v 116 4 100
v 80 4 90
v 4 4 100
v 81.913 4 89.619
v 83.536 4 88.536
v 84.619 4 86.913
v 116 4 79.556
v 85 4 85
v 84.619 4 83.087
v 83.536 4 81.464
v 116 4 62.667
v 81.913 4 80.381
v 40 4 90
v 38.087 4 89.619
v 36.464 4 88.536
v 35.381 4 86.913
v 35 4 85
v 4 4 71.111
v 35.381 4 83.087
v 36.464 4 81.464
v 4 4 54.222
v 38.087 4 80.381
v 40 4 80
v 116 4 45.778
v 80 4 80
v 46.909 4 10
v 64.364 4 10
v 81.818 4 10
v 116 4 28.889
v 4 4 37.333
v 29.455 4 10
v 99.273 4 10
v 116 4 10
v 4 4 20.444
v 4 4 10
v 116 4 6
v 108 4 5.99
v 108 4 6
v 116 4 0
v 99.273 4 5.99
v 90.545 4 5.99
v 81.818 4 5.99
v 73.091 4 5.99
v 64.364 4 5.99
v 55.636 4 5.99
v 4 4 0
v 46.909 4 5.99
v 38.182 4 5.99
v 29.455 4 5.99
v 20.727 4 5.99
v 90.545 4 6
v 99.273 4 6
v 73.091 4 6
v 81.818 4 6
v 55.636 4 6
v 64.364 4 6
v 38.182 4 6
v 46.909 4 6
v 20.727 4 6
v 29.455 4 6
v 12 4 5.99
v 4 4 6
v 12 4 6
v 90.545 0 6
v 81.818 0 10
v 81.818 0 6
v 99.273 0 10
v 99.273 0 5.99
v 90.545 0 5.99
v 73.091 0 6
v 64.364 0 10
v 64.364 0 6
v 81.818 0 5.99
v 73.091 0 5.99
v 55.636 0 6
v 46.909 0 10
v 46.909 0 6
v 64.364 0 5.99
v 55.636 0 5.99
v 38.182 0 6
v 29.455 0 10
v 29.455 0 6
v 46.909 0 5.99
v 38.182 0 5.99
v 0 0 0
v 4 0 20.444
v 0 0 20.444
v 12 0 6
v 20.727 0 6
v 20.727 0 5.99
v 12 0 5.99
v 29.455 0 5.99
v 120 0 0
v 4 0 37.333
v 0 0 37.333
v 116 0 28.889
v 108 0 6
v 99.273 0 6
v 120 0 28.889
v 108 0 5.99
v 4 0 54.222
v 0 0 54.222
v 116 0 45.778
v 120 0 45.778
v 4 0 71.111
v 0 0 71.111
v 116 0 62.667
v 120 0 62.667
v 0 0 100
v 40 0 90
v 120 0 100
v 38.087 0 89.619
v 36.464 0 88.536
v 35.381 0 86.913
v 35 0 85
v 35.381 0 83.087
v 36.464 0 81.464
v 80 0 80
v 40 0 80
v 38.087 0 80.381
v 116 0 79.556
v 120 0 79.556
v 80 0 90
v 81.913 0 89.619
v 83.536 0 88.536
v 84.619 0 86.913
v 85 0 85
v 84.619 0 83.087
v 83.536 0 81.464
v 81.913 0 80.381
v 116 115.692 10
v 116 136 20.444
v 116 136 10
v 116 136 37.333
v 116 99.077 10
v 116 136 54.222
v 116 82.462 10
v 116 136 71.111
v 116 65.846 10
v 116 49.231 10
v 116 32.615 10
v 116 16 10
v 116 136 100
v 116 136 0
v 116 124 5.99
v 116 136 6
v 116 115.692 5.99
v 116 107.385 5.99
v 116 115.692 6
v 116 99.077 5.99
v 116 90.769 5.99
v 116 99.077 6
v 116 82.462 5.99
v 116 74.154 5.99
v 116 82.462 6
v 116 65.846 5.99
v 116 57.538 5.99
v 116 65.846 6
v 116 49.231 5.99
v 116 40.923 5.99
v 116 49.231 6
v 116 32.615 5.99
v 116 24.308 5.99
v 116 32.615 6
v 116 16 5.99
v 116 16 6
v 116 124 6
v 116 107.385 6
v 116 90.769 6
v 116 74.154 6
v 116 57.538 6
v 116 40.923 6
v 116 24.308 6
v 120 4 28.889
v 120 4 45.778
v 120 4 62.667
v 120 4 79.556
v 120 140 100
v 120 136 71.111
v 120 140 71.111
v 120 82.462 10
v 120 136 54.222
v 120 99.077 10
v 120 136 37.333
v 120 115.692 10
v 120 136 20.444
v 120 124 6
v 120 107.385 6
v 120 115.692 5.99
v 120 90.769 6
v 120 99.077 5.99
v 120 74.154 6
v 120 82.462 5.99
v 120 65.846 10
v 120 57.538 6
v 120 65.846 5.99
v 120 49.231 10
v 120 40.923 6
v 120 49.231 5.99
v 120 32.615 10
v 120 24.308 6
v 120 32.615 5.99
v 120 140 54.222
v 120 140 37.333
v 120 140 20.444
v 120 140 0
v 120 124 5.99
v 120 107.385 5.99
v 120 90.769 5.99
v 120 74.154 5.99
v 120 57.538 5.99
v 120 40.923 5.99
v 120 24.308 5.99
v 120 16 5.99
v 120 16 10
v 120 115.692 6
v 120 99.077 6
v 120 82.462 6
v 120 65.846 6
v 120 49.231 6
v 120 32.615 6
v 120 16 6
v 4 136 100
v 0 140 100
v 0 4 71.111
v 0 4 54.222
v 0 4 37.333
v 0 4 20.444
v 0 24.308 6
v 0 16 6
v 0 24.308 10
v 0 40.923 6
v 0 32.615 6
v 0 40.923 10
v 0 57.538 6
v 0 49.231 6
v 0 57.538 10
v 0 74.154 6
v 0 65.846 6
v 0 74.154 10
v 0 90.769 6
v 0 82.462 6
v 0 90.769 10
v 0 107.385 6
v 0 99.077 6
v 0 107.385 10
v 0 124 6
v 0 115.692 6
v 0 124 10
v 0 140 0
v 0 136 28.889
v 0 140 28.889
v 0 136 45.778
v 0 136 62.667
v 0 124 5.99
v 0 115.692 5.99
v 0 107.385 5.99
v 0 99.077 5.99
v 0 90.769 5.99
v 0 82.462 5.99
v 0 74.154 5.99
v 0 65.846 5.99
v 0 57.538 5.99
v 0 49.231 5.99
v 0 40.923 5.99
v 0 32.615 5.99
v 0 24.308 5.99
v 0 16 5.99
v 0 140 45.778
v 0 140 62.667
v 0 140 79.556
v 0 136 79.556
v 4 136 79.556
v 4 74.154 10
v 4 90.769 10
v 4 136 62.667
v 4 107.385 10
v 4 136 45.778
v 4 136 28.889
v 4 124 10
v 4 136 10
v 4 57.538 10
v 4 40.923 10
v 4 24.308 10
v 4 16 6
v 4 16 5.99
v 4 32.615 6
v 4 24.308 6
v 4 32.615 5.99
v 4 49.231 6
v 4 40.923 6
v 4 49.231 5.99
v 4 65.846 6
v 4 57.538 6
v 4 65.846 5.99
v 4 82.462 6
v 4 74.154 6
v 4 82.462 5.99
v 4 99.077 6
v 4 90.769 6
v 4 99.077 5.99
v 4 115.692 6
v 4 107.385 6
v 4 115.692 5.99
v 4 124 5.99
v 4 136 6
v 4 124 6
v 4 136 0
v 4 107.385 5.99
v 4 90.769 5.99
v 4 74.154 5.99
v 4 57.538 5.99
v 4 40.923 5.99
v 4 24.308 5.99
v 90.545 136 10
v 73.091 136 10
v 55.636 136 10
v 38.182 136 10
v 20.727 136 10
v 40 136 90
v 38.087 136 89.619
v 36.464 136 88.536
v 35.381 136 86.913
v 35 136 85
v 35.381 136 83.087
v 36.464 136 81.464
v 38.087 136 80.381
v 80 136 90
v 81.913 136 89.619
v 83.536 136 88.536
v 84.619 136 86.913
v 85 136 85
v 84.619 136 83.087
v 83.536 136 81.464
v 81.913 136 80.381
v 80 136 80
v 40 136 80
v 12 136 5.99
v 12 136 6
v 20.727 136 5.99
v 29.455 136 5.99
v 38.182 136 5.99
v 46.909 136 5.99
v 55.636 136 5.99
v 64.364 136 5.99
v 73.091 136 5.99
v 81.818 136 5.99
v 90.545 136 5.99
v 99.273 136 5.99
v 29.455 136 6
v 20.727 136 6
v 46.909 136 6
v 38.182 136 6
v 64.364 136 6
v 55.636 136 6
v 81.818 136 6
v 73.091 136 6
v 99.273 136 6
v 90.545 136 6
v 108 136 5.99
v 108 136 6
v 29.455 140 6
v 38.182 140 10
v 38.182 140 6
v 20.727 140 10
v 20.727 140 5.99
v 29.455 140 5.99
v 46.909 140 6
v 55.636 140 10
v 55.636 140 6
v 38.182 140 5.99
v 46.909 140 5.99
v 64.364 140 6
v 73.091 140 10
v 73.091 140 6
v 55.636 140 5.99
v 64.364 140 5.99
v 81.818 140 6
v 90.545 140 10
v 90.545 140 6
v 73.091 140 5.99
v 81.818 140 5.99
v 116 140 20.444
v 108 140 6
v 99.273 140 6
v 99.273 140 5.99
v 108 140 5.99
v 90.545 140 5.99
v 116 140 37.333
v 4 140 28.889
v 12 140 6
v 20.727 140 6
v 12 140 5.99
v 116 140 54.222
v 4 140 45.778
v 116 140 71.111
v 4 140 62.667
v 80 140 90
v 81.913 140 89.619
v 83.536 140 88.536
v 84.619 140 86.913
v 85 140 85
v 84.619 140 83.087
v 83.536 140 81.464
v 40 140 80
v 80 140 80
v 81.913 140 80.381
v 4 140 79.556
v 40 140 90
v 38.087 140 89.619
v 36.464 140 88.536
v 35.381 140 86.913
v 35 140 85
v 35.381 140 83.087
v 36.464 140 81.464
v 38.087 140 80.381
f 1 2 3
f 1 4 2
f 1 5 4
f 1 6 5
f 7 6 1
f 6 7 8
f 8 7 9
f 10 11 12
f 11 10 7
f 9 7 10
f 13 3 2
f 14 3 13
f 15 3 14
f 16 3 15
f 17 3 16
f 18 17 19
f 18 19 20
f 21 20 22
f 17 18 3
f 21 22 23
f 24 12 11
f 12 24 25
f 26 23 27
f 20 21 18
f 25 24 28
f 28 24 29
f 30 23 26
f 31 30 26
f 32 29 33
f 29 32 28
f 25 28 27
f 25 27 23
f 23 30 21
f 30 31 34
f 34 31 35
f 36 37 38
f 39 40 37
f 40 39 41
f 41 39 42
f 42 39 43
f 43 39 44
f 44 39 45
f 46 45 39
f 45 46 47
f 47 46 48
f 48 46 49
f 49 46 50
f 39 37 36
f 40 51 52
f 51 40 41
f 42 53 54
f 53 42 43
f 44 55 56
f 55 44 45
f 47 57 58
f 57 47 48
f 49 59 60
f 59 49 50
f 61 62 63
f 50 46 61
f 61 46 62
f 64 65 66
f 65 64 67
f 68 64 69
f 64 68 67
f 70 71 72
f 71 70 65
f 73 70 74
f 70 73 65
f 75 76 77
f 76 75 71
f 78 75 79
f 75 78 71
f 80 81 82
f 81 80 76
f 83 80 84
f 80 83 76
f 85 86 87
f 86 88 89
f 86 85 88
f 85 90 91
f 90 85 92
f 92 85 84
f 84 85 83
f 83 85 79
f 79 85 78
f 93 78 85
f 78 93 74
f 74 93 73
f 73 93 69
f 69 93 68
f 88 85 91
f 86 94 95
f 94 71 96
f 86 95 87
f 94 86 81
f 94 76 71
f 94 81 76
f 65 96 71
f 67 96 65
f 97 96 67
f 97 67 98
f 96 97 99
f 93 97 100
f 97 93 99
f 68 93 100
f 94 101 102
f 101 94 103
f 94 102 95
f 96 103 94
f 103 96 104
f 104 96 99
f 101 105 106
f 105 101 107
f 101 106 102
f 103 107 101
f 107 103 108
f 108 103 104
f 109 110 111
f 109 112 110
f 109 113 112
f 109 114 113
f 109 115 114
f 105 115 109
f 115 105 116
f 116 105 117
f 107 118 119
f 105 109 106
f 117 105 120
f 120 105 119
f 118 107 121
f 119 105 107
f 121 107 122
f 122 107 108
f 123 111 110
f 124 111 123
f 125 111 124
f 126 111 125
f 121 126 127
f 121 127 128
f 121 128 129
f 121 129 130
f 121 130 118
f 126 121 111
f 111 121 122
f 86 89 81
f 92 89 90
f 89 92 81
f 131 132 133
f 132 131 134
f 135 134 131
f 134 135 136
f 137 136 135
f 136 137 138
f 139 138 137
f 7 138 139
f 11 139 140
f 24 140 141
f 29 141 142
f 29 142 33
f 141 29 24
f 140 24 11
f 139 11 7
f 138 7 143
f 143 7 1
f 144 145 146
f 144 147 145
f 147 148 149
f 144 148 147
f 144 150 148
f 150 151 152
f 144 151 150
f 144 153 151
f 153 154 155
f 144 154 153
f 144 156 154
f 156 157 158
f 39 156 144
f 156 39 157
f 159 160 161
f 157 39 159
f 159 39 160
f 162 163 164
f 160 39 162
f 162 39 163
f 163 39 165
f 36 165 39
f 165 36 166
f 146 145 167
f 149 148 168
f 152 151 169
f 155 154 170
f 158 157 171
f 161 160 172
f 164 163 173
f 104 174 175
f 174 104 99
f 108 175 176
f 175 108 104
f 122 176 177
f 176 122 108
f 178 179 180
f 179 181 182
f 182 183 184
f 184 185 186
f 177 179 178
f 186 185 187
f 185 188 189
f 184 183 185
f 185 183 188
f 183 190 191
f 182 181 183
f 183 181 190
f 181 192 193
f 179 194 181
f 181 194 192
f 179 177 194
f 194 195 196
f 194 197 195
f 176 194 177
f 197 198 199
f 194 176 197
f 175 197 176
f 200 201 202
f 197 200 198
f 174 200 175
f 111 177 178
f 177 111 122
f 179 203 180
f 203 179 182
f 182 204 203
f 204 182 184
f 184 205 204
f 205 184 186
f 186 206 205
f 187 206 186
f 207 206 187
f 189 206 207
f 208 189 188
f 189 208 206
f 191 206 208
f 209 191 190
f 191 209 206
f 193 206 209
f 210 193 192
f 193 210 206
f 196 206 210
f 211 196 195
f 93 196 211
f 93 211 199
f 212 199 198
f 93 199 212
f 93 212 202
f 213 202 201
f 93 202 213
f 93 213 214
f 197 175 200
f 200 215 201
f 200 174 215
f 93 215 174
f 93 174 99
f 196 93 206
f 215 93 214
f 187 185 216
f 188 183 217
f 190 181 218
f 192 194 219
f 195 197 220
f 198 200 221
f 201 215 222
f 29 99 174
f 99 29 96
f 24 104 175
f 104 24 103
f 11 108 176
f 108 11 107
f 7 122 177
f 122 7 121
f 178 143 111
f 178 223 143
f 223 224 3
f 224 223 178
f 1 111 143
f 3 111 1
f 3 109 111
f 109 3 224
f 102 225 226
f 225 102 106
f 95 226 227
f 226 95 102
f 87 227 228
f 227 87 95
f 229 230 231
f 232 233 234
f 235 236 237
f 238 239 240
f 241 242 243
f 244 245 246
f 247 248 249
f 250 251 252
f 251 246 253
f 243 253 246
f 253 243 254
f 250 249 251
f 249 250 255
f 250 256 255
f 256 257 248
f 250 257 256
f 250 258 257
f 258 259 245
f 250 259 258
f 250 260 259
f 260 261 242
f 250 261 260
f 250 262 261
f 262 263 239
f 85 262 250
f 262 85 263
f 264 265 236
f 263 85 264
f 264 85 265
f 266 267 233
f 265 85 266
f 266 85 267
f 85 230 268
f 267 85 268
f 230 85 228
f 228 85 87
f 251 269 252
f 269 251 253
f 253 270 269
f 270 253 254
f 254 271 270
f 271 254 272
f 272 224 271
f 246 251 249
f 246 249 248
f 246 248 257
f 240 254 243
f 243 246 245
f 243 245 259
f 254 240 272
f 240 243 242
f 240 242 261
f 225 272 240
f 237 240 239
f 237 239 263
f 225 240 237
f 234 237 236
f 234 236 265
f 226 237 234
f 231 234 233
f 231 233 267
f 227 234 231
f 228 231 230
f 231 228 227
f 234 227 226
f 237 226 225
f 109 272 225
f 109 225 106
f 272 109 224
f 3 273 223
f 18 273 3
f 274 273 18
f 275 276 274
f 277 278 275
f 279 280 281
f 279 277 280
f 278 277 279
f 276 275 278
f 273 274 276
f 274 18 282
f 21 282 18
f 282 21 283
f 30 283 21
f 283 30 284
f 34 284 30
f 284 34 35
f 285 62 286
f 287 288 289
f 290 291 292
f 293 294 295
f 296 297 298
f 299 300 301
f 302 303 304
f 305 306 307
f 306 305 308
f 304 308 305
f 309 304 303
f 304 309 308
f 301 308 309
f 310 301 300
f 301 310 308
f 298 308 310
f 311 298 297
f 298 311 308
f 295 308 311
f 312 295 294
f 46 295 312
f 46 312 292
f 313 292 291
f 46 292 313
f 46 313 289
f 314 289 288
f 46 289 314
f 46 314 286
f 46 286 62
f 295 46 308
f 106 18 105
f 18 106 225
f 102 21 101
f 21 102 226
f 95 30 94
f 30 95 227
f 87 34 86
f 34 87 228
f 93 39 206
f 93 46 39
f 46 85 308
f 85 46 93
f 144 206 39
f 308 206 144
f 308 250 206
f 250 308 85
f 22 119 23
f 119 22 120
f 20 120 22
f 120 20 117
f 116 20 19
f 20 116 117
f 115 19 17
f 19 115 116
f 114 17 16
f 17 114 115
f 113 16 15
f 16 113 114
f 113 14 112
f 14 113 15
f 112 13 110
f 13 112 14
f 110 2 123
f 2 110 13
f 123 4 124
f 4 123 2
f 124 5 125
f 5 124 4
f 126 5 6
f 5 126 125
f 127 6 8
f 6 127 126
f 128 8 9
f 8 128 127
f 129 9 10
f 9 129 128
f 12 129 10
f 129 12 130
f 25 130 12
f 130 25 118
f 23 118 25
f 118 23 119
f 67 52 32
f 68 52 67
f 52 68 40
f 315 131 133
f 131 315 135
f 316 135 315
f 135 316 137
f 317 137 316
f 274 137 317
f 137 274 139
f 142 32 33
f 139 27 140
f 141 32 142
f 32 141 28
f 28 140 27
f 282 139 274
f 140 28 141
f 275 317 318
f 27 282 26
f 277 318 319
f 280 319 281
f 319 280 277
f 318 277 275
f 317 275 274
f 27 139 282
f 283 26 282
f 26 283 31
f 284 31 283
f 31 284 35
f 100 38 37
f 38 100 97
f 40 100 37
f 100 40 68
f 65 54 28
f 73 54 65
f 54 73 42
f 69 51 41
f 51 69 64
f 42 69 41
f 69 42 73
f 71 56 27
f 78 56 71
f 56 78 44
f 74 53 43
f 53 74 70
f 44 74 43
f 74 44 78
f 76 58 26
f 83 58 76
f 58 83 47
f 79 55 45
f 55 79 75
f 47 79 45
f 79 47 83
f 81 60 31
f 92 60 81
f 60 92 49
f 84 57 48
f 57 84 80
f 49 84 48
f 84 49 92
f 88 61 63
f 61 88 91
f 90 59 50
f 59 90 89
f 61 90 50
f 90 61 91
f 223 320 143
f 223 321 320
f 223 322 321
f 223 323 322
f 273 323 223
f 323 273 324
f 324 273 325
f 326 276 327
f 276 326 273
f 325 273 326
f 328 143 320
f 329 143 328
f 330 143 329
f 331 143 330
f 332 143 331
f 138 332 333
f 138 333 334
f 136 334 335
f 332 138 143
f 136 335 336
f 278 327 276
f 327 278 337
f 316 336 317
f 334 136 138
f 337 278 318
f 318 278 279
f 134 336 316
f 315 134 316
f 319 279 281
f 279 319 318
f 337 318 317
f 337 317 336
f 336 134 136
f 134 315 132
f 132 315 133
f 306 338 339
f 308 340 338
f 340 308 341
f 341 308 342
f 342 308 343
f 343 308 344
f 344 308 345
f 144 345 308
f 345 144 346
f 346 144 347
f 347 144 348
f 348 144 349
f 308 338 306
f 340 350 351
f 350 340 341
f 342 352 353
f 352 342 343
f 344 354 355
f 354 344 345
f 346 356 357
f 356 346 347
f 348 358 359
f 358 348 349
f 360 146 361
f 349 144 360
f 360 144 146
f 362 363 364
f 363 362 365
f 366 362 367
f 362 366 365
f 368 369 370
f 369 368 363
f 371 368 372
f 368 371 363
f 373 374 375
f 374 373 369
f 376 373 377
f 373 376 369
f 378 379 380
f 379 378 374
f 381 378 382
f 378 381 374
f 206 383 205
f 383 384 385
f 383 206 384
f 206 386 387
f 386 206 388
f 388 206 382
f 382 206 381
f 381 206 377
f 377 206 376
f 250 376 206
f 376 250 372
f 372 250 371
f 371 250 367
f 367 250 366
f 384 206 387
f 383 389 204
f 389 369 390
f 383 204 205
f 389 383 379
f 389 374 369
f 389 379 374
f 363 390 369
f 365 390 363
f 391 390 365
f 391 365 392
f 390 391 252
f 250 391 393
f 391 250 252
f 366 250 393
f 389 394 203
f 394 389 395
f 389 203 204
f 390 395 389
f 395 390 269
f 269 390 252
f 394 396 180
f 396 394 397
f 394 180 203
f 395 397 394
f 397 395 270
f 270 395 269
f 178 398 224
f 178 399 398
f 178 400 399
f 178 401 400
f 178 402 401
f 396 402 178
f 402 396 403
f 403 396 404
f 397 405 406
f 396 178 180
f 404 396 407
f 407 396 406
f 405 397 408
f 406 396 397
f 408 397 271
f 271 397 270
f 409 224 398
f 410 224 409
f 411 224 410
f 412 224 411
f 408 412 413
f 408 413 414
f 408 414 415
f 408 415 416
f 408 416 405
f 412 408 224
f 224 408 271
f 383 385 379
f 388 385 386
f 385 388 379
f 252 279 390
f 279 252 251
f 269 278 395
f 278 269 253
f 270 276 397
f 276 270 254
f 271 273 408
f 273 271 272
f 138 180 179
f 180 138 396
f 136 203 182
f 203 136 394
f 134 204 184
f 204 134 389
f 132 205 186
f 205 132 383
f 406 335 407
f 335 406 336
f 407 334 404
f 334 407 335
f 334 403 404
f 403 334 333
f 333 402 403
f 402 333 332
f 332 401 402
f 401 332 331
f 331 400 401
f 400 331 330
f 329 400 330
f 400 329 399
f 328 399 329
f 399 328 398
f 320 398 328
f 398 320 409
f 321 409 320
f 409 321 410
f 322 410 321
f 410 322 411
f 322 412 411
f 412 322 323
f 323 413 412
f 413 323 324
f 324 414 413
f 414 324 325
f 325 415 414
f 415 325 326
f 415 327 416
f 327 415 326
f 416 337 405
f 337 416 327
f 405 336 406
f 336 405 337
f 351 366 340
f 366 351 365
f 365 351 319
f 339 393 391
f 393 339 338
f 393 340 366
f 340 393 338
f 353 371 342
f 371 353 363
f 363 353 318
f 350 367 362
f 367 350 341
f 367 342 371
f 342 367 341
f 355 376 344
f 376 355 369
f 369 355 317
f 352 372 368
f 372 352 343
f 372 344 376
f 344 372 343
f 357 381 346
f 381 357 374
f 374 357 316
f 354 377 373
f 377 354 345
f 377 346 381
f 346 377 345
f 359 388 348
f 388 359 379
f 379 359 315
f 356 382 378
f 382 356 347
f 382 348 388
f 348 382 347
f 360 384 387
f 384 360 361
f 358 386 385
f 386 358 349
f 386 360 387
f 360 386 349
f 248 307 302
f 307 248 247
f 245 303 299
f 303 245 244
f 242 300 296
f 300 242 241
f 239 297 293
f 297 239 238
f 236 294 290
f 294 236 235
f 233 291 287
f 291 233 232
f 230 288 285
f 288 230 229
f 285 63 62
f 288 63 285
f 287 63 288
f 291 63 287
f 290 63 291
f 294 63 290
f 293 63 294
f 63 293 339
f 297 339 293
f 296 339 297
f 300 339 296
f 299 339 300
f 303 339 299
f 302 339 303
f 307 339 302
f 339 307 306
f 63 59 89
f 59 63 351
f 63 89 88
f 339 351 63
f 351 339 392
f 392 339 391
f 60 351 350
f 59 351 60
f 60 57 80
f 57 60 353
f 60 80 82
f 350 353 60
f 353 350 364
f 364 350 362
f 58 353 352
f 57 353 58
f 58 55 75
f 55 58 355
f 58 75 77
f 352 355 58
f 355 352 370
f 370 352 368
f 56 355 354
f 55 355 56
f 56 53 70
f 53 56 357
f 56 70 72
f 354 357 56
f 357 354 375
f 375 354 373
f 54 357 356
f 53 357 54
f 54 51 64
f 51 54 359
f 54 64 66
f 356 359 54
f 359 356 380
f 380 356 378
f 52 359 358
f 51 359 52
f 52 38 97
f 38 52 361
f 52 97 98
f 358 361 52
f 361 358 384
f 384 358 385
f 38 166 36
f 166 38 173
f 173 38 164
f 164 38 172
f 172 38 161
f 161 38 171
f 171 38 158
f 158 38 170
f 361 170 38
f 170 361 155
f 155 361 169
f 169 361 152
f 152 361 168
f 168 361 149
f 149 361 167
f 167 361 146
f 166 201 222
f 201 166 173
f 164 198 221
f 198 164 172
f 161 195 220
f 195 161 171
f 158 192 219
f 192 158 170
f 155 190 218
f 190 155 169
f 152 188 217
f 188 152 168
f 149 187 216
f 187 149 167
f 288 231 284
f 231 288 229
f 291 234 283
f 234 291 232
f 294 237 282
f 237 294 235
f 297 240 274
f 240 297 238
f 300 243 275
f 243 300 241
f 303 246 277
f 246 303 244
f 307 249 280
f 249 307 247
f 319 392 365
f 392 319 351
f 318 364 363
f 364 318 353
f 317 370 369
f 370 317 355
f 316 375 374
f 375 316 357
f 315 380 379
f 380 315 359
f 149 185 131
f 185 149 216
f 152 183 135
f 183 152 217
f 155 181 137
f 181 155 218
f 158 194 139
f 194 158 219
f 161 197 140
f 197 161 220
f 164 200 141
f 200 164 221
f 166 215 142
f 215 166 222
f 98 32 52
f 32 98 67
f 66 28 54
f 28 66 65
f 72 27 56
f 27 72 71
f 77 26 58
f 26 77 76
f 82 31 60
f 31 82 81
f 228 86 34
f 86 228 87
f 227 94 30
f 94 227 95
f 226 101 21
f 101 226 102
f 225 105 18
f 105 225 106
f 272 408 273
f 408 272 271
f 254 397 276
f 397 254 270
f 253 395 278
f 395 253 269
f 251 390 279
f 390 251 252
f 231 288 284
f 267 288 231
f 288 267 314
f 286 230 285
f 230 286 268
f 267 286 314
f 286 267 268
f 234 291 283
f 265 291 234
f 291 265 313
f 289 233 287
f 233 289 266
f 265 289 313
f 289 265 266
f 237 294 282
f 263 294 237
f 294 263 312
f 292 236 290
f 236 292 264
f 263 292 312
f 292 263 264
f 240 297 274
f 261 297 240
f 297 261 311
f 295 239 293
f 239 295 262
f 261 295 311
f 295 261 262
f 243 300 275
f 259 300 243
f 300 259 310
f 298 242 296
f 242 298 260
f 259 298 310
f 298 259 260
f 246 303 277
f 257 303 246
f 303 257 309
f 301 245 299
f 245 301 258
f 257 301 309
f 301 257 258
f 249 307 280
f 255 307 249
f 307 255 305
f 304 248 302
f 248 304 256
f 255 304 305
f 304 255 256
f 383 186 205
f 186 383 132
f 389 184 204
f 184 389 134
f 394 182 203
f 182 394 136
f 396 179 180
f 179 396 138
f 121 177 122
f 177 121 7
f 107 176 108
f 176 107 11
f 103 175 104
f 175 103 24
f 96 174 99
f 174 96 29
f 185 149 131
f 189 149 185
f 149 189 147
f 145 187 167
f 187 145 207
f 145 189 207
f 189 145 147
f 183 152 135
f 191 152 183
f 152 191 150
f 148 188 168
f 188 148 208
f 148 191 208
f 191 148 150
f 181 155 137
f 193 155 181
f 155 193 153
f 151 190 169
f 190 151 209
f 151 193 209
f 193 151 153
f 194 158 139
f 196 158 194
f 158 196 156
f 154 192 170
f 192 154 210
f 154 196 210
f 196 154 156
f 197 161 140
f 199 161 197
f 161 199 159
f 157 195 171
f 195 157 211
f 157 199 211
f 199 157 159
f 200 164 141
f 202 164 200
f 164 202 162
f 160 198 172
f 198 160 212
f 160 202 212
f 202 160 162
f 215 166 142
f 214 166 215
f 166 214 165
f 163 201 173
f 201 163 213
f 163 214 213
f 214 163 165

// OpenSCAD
include <../box.scad>
box(width = 120, height = 100, depth = 140, thickness = 4,
    open = true, assemble = true,
    hole_width = 50, hole_height = 10, hole_margin = 10,
    inset = 6);
